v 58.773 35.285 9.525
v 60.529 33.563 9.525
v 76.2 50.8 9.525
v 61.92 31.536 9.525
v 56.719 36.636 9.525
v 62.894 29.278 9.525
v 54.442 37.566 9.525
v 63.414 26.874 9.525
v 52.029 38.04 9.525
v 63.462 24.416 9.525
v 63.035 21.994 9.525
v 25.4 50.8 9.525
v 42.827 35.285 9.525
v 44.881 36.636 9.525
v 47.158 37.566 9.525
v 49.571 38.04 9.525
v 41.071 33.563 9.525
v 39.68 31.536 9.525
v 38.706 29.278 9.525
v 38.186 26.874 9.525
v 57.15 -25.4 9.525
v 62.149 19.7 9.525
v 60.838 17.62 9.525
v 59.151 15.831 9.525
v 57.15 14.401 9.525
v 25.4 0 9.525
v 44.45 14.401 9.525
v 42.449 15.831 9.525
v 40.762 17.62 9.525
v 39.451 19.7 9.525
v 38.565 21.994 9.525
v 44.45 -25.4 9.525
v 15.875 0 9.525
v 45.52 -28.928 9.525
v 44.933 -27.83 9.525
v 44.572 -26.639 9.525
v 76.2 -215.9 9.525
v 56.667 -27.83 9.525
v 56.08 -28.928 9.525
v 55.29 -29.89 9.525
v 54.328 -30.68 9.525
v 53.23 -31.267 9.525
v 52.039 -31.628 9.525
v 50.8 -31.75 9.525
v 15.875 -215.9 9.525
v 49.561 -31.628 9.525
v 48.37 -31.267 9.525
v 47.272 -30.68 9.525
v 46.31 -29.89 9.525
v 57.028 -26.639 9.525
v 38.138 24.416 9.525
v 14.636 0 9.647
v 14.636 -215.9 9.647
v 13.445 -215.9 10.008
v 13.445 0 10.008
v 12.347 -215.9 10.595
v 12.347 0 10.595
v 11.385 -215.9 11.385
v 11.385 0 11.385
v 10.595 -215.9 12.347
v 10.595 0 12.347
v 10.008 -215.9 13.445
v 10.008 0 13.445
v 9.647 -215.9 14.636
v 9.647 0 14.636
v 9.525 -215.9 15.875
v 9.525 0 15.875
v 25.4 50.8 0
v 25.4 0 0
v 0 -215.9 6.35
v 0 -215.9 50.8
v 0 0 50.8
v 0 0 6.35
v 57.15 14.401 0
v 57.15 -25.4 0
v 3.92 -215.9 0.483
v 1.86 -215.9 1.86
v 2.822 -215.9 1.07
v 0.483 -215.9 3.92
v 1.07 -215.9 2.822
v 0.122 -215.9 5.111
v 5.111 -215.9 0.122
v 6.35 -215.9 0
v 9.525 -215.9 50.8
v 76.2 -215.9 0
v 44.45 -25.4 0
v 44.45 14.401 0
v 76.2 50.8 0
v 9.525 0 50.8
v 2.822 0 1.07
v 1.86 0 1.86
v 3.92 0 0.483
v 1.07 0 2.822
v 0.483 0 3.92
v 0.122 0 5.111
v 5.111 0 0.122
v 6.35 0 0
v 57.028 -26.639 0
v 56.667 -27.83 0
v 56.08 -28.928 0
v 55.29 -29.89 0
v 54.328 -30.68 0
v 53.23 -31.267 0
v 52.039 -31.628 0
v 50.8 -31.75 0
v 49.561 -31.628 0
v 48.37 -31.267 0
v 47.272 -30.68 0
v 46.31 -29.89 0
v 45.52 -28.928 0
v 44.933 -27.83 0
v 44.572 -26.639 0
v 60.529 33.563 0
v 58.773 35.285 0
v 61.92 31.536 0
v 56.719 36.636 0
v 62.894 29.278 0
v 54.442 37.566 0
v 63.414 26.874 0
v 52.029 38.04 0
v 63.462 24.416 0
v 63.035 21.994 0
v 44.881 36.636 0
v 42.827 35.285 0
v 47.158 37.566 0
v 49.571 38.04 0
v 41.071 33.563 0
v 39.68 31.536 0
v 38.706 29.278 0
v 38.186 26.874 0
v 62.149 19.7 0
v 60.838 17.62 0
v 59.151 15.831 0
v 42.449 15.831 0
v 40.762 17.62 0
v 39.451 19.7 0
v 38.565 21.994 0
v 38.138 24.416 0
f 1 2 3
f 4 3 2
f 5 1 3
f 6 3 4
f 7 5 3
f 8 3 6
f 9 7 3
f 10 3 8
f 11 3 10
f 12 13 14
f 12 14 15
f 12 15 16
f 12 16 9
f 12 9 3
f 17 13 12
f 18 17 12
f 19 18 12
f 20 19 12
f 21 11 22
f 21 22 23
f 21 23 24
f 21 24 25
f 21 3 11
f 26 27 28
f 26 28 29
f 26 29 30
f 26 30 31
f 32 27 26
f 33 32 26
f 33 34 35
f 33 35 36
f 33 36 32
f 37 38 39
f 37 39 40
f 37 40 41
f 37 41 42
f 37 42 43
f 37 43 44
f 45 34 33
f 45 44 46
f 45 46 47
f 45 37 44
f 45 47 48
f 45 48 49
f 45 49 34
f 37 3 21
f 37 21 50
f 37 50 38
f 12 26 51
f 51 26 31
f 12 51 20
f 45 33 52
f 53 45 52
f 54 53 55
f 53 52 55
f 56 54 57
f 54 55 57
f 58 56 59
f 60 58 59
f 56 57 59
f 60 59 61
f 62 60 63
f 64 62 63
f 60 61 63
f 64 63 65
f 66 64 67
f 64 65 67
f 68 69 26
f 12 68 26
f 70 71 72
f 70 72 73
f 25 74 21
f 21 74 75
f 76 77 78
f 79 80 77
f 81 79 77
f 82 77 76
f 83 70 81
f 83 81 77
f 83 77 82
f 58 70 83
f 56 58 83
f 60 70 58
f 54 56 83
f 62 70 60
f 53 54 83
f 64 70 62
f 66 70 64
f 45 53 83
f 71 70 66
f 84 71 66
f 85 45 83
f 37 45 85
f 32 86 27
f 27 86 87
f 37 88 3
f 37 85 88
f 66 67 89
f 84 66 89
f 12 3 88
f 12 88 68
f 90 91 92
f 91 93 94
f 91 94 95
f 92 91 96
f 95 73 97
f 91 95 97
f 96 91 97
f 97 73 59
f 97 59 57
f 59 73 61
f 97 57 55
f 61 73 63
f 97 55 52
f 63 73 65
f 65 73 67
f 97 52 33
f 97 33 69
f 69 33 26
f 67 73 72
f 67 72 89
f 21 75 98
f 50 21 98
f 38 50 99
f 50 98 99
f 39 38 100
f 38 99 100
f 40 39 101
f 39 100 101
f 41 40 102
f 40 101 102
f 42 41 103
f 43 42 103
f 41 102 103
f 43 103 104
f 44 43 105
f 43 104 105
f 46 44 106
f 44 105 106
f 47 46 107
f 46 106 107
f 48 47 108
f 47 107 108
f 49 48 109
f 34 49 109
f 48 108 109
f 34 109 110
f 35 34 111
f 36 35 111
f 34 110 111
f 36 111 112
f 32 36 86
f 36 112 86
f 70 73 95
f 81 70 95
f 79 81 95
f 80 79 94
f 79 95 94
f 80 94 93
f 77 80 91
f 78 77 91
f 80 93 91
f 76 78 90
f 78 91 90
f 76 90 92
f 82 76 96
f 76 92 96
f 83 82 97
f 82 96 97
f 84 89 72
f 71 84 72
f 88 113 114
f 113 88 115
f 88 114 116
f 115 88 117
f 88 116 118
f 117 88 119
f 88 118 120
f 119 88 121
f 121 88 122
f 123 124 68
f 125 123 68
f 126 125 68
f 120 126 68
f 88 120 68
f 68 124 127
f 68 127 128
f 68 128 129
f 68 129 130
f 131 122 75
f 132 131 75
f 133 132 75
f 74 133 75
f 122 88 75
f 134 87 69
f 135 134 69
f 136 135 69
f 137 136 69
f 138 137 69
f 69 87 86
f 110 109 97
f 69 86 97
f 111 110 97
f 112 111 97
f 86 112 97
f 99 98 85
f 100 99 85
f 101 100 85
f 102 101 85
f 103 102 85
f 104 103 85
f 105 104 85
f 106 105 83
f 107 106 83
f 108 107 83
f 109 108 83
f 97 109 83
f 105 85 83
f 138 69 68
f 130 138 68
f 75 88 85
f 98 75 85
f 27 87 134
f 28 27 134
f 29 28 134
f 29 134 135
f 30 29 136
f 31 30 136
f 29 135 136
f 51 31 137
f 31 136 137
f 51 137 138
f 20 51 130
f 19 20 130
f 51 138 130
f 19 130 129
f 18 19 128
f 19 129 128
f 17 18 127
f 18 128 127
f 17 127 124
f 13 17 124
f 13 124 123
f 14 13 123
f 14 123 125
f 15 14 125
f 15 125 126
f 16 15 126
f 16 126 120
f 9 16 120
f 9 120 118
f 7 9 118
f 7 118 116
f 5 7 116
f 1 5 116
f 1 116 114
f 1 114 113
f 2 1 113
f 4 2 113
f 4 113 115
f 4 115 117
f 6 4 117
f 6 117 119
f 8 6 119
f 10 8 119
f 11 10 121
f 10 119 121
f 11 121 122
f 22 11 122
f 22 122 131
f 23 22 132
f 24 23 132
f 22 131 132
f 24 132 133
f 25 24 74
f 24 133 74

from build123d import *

# Parameters (mm, degrees)
F1_DEPTH = 215.9
F2_W     = 50.8
F2_H     = 9.525
F3_DEPTH = 50.8
F5_DEPTH = 50.801


with BuildPart() as f1:
    # F0 (on Front) → F1 (new body)
    with BuildSketch(Plane.XZ):
        with BuildLine():
            Line((9.525, 50.8), (0, 50.8))
            Line((0, 50.8), (0, 6.35))
            ThreePointArc((0, 6.35), (1.859872, 1.859872), (6.35, 0))
            Line((6.35, 0), (76.2, 0))
            Line((76.2, 0), (76.2, 9.525))
            Line((76.2, 9.525), (15.875, 9.525))
            ThreePointArc((15.875, 9.525), (11.384872, 11.384872), (9.525, 15.875))
            Line((9.525, 15.875), (9.525, 50.8))
        make_face()
    extrude(amount=F1_DEPTH)

    # F2 (on face) → F3 (join)
    with BuildSketch(Plane(origin=(0, 0, 0), x_dir=(-1, 0, 0), z_dir=(0, 1, 0))):
        with Locations((-50.8, 4.7625)):
            Rectangle(F2_W, F2_H)
    extrude(amount=F3_DEPTH)

    # F4 (on face) → F5 (cut, through all)
    with BuildSketch(Plane(origin=(0, 0, 0), x_dir=(1, 0, 0), z_dir=(0, 0, -1))):
        with BuildLine():
            Line((44.45, 25.4), (44.45, -14.401477))
            ThreePointArc((44.45, -14.401477), (50.8, -38.1), (57.15, -14.401477))
            Line((57.15, -14.401477), (57.15, 25.4))
            ThreePointArc((57.15, 25.4), (50.8, 31.75), (44.45, 25.4))
        make_face()
    extrude(amount=-F5_DEPTH, mode=Mode.SUBTRACT)


solid = f1.part
